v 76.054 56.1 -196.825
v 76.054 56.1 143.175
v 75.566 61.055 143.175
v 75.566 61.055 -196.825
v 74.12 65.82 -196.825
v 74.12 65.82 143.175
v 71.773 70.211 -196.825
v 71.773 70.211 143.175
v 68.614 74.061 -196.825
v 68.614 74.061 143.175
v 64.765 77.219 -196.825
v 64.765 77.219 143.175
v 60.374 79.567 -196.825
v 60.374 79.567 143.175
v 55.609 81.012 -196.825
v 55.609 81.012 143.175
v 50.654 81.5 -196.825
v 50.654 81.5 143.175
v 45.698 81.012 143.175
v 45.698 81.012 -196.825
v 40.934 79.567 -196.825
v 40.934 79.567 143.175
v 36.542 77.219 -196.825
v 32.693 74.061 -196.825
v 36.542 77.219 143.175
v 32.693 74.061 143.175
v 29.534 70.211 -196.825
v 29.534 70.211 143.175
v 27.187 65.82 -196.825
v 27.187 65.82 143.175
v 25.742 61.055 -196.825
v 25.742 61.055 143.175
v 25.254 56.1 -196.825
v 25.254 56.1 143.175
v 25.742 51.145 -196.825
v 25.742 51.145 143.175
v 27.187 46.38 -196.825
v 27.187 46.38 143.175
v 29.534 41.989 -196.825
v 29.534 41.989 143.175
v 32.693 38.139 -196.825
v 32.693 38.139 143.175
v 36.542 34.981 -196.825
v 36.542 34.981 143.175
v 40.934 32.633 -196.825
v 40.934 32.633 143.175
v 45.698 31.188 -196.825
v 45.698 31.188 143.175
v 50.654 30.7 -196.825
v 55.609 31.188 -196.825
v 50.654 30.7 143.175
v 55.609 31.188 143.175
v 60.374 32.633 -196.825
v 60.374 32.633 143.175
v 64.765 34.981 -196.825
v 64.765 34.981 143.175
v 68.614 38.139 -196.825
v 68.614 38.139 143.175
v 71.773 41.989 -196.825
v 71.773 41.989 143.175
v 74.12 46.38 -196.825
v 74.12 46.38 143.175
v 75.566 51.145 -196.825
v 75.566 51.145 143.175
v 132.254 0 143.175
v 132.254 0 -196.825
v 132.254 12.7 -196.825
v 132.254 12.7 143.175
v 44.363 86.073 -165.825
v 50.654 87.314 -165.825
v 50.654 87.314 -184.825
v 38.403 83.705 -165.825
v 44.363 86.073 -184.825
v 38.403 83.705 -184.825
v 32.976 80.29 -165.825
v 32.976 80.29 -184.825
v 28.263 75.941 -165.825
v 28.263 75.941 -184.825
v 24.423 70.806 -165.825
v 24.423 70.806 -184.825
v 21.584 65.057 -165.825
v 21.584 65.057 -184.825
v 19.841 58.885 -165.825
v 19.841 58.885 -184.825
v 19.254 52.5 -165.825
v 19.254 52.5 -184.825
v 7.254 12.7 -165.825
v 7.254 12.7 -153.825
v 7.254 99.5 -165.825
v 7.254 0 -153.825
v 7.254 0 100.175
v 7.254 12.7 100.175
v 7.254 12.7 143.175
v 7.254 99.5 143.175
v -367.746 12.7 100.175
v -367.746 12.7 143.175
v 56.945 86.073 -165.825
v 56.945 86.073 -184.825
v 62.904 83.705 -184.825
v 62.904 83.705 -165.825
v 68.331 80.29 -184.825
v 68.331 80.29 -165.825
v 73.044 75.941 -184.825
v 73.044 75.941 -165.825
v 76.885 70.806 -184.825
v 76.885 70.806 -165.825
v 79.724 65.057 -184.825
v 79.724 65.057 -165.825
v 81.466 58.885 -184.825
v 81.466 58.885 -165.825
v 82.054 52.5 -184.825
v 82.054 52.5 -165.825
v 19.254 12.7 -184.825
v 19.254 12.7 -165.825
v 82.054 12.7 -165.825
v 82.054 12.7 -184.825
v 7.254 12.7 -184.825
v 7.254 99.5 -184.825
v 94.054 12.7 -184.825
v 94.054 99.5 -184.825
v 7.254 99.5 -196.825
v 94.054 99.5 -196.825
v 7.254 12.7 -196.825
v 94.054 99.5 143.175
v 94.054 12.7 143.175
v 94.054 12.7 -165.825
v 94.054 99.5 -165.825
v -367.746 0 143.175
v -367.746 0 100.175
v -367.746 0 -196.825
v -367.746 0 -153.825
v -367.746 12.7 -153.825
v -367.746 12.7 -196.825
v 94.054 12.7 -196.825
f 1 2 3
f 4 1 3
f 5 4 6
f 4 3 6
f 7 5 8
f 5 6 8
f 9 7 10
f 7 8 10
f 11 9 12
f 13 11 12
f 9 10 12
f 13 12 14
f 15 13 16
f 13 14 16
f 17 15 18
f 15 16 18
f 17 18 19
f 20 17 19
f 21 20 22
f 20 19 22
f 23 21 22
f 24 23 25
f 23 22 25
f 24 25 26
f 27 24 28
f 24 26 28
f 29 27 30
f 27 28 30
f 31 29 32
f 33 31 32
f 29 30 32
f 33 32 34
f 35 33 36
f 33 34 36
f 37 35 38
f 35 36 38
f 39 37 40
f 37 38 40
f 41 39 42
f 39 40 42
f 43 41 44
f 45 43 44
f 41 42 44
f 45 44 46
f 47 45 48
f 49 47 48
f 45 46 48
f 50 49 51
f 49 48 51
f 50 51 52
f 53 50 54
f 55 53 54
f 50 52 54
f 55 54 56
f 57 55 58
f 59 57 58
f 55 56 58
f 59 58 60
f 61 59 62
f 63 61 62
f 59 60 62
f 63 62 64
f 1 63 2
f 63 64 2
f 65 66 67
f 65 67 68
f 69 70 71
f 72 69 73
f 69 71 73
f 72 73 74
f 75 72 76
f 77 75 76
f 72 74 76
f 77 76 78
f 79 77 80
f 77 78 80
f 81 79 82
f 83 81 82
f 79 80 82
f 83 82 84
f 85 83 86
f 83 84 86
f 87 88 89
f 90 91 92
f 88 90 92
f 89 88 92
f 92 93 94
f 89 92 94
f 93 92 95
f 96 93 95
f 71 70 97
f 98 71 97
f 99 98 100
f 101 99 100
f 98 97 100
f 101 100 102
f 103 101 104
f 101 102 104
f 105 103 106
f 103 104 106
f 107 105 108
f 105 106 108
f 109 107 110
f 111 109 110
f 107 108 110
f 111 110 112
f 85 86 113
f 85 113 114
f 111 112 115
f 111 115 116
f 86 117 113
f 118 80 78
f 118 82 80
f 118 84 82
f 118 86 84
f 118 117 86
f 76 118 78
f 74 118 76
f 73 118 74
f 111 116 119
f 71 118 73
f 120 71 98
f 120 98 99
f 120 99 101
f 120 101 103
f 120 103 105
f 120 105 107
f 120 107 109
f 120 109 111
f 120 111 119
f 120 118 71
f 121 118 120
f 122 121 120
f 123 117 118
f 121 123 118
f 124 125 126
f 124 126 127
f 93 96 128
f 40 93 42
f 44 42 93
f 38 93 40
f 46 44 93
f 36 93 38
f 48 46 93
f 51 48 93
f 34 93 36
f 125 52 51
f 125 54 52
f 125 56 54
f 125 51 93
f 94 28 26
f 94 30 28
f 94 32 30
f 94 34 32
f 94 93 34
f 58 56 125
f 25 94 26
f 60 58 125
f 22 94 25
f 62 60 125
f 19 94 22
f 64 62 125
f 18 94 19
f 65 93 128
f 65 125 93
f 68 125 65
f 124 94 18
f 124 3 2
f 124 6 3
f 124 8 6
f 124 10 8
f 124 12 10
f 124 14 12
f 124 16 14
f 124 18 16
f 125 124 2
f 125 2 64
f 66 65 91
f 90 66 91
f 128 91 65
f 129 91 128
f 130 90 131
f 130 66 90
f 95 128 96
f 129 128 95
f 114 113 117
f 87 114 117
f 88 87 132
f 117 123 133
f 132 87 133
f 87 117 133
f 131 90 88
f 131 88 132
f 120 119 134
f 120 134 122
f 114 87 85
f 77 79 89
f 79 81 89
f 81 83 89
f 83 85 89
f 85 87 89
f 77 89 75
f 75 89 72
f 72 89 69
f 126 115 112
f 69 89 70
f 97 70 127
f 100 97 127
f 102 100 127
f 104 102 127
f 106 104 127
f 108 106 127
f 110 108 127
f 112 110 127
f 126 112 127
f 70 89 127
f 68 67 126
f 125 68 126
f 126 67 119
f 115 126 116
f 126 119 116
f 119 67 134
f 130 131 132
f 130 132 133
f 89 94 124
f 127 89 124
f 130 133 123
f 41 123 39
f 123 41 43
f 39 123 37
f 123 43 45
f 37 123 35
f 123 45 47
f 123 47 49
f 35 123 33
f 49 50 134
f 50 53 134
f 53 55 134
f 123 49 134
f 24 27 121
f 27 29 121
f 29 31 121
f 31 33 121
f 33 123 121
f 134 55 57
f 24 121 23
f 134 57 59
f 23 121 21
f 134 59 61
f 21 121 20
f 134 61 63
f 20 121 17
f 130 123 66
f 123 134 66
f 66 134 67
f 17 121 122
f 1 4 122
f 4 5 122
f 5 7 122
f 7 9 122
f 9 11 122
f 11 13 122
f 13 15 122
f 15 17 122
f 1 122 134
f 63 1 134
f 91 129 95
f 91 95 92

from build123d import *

# Parameters (mm, degrees)
BOSS_EXTRUDE1_DEPTH = 12.7
SKETCH4_W           = 86.8
SKETCH4_H           = 86.8
SKETCH4_R           = 25.4
BOSS_EXTRUDE3_DEPTH = 340
SKETCH6_W           = 86.8
SKETCH6_H           = 19
CUT_EXTRUDE3_DEPTH  = 12
SKETCH7_W           = 19
SKETCH7_H           = 74.8
CUT_EXTRUDE4_DEPTH  = 12
SKETCH8_W           = 19
SKETCH8_H           = 74.8
CUT_EXTRUDE5_DEPTH  = 12
FILLET2_R           = 35


with BuildPart() as part:
    # Sketch1 → Boss-Extrude1 (new body)
    with BuildSketch(Plane(origin=(0, 0, 0), x_dir=(1, 0, 0), z_dir=(0, 1, 0))):
        Polygon((-367.746211961, 196.825353899), (132.253788039, 196.825353899), (132.253788039, -143.174646101), (-367.746211961, -143.174646101), (-367.746211961, -100.174646101), (7.253788039, -100.174646101), (7.253788039, 153.825353899), (-367.746211961, 153.825353899), align=None)
    extrude(amount=BOSS_EXTRUDE1_DEPTH)

    # Sketch4 → Boss-Extrude3 (add)
    with BuildSketch(Plane.XY.offset(143.174646101)):
        with Locations((50.653788039, 56.1)):
            Rectangle(SKETCH4_W, SKETCH4_H)
        with Locations((50.653788039, 56.1)):
            Circle(SKETCH4_R, mode=Mode.SUBTRACT)
    extrude(amount=-BOSS_EXTRUDE3_DEPTH)

    # Sketch6 → Cut-Extrude3 (cut)
    with BuildSketch(Plane(origin=(0, 99.5, 0), x_dir=(1, 0, 0), z_dir=(0, 1, 0))):
        with Locations((50.653788039, 175.325353899)):
            Rectangle(SKETCH6_W, SKETCH6_H)
    extrude(amount=-CUT_EXTRUDE3_DEPTH, mode=Mode.SUBTRACT)

    # Sketch7 → Cut-Extrude4 (cut)
    with BuildSketch(Plane.ZY.offset(-7.253788039)):
        with Locations((-175.325353899, 50.1)):
            Rectangle(SKETCH7_W, SKETCH7_H)
    extrude(amount=-CUT_EXTRUDE4_DEPTH, mode=Mode.SUBTRACT)

    # Sketch8 → Cut-Extrude5 (cut)
    with BuildSketch(Plane(origin=(94.053788039, 0, 0), x_dir=(0, 0, -1), z_dir=(1, 0, 0))):
        with Locations((175.325353899, 50.1)):
            Rectangle(SKETCH8_W, SKETCH8_H)
    extrude(amount=-CUT_EXTRUDE5_DEPTH, mode=Mode.SUBTRACT)

    # Fillet2
    # the kernel refuses this fillet: 35 mm, written as the material it takes off along each edge
    with BuildSketch(Plane(origin=(82.053788039, 87.5, -165.825353899), x_dir=(-1, 0, 0), z_dir=(0, 0, -1))) as fillet2_piece_1:
        with BuildLine():
            CenterArc((FILLET2_R, -FILLET2_R), FILLET2_R, 90, 90)
            Line((0, -FILLET2_R), (0, 0))
            Line((0, 0), (FILLET2_R, 0))
        make_face()
    extrude(amount=19, mode=Mode.SUBTRACT)
    with BuildSketch(Plane(origin=(19.253788039, 87.5, -184.825353899), x_dir=(0, -1, 0), z_dir=(0, 0, 1))) as fillet2_piece_2:
        with BuildLine():
            CenterArc((FILLET2_R, FILLET2_R), FILLET2_R, 180, 90)
            Line((0, FILLET2_R), (0, 0))
            Line((0, 0), (FILLET2_R, 0))
        make_face()
    extrude(amount=19, mode=Mode.SUBTRACT)


solid = part.part
